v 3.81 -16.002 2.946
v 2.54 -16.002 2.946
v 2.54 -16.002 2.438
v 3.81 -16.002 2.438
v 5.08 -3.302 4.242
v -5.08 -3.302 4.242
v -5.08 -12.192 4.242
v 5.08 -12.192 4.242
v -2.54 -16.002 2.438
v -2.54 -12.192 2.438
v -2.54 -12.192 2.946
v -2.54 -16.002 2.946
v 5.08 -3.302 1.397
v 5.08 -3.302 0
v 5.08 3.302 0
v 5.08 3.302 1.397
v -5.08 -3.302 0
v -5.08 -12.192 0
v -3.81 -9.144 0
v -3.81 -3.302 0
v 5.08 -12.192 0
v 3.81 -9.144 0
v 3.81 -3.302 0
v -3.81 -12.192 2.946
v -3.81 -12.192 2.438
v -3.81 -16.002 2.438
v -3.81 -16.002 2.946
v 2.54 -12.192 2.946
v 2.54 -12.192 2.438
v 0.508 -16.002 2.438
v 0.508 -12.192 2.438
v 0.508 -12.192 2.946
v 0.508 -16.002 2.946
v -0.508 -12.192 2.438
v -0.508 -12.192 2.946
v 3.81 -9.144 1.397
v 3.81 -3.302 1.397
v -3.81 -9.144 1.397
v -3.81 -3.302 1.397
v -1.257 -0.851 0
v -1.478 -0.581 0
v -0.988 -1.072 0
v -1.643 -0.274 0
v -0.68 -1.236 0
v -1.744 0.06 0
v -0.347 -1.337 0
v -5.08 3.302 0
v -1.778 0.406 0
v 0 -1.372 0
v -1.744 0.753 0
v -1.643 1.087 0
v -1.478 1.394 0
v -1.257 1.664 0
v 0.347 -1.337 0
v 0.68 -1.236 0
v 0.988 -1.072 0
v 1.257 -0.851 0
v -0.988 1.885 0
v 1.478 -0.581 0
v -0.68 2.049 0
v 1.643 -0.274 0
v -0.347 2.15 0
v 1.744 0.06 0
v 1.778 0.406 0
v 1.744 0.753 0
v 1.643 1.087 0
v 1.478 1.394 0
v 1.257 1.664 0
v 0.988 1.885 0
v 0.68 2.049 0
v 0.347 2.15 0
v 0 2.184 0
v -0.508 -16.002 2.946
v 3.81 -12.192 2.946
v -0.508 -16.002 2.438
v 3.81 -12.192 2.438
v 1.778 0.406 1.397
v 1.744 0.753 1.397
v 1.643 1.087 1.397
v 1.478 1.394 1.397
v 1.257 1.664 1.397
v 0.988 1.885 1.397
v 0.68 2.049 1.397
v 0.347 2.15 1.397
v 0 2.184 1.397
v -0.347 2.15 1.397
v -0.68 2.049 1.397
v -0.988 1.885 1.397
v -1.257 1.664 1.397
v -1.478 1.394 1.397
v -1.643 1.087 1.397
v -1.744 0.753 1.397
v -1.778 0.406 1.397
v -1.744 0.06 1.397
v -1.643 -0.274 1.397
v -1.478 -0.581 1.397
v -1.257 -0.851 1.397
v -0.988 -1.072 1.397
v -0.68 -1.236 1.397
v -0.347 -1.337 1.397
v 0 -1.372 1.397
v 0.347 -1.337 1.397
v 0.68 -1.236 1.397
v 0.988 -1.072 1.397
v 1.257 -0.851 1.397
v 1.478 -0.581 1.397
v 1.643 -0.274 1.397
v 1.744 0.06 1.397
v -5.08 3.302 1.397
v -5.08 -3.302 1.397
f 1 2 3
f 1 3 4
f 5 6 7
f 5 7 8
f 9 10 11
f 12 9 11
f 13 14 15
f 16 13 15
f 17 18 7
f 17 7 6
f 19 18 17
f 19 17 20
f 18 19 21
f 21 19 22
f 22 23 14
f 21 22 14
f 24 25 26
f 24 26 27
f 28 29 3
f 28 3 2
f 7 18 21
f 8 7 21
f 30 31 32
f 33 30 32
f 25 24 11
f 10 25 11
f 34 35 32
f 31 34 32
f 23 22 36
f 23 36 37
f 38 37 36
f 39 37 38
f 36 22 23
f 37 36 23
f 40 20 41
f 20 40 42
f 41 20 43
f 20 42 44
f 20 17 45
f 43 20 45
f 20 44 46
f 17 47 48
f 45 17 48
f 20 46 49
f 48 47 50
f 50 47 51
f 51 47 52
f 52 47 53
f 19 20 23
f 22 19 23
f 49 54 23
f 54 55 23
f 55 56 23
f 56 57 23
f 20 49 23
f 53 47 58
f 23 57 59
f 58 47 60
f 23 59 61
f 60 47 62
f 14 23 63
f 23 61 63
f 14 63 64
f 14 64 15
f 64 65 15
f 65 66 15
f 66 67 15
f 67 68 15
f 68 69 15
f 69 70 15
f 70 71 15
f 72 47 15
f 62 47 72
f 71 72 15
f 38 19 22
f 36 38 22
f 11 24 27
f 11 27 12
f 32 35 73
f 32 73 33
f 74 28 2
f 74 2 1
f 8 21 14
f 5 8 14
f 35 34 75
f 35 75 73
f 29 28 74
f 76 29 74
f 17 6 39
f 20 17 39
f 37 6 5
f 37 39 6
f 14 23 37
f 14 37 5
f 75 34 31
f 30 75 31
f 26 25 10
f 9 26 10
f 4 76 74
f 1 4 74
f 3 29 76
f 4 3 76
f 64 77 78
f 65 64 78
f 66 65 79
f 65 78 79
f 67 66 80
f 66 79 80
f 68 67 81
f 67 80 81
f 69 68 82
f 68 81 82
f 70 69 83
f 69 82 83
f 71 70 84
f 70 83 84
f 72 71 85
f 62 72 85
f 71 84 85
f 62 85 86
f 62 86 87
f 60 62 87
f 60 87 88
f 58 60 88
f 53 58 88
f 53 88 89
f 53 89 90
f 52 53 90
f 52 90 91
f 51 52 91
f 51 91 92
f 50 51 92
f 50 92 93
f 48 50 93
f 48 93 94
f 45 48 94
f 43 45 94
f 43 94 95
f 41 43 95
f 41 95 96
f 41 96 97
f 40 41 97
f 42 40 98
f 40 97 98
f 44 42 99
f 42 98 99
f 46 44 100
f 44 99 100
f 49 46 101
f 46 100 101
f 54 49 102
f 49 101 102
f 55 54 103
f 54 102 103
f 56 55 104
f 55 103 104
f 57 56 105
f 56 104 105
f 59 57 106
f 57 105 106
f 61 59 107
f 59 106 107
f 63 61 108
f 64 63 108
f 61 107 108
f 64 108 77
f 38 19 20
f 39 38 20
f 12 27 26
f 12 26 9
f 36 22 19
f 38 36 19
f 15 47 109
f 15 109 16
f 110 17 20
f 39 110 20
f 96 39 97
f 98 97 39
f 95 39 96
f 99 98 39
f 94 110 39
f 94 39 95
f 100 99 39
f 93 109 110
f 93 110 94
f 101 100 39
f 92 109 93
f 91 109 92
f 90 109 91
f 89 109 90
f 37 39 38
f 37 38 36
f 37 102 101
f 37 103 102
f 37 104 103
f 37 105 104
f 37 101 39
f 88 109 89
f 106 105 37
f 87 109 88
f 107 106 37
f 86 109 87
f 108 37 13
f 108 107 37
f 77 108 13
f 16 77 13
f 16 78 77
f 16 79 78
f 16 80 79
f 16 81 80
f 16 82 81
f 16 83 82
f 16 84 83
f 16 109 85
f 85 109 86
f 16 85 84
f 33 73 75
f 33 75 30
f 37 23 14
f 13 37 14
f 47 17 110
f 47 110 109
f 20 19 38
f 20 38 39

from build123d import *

# Parameters (mm, degrees)
SKETCH2_W             = 10.16
SKETCH2_H             = 6.604
SKETCH2_W_2           = 7.62
SKETCH2_H_2           = 5.842
BOSS_EXTRUDE1_DEPTH   = 1.397
SKETCH3_R             = 1.778
CUT_EXTRUDE1_DEPTH    = 11.553233865
SKETCH4_W             = 10.16
SKETCH4_H             = 8.89
BOSS_EXTRUDE2_DEPTH   = 4.2418
SKETCH7_W             = 7.62
SKETCH7_H             = 5.842
CUT_EXTRUDE3_DEPTH    = 1.397
SKETCH8_W             = 1.27
SKETCH8_H             = 0.508
BOSS_EXTRUDE3_DEPTH   = 3.81
BOSS_EXTRUDE3_2_DEPTH = 3.81
SKETCH8_W_2           = 1.016
BOSS_EXTRUDE3_3_DEPTH = 3.81


with BuildPart() as part:
    # Sketch2 → Boss-Extrude1 (new body)
    with BuildSketch(Plane.XY):
        Rectangle(SKETCH2_W, SKETCH2_H)
        with Locations((0, -6.223)):
            Rectangle(SKETCH2_W_2, SKETCH2_H_2)
    extrude(amount=BOSS_EXTRUDE1_DEPTH)

    # Sketch3 → Cut-Extrude1 (cut, through all)
    with BuildSketch(Plane.XY.offset(1.397)):
        with Locations((0, 0.4064)):
            Circle(SKETCH3_R)
    extrude(amount=-CUT_EXTRUDE1_DEPTH, mode=Mode.SUBTRACT)


with BuildPart() as body_2:
    # Sketch4 → Boss-Extrude2 (new body)
    with BuildSketch(Plane.XY):
        with Locations((0, -7.747)):
            Rectangle(SKETCH4_W, SKETCH4_H)
    extrude(amount=BOSS_EXTRUDE2_DEPTH)

    # Sketch7 → Cut-Extrude3 (cut)
    with BuildSketch(Plane(origin=(0, 0, 0), x_dir=(-1, 0, 0), z_dir=(0, 0, -1))):
        with Locations((0, -6.223)):
            Rectangle(SKETCH7_W, SKETCH7_H)
    extrude(amount=-CUT_EXTRUDE3_DEPTH, mode=Mode.SUBTRACT)


with BuildPart() as body_3:
    # Sketch8 → Boss-Extrude3 (new body)
    with BuildSketch(Plane.XZ.offset(12.192)):
        with Locations((-3.175, 2.6924)):
            Rectangle(SKETCH8_W, SKETCH8_H)
    extrude(amount=BOSS_EXTRUDE3_DEPTH)


with BuildPart() as body_4:
    # Sketch8 → Boss-Extrude3 2 (new body)
    with BuildSketch(Plane.XZ.offset(12.192)):
        with Locations((3.175, 2.6924)):
            Rectangle(SKETCH8_W, SKETCH8_H)
    extrude(amount=BOSS_EXTRUDE3_2_DEPTH)


with BuildPart() as body_5:
    # Sketch8 → Boss-Extrude3 3 (new body)
    with BuildSketch(Plane.XZ.offset(12.192)):
        with Locations((0, 2.6924)):
            Rectangle(SKETCH8_W_2, SKETCH8_H)
    extrude(amount=BOSS_EXTRUDE3_3_DEPTH)


solid = Compound([part.part, body_2.part, body_3.part, body_4.part, body_5.part])
